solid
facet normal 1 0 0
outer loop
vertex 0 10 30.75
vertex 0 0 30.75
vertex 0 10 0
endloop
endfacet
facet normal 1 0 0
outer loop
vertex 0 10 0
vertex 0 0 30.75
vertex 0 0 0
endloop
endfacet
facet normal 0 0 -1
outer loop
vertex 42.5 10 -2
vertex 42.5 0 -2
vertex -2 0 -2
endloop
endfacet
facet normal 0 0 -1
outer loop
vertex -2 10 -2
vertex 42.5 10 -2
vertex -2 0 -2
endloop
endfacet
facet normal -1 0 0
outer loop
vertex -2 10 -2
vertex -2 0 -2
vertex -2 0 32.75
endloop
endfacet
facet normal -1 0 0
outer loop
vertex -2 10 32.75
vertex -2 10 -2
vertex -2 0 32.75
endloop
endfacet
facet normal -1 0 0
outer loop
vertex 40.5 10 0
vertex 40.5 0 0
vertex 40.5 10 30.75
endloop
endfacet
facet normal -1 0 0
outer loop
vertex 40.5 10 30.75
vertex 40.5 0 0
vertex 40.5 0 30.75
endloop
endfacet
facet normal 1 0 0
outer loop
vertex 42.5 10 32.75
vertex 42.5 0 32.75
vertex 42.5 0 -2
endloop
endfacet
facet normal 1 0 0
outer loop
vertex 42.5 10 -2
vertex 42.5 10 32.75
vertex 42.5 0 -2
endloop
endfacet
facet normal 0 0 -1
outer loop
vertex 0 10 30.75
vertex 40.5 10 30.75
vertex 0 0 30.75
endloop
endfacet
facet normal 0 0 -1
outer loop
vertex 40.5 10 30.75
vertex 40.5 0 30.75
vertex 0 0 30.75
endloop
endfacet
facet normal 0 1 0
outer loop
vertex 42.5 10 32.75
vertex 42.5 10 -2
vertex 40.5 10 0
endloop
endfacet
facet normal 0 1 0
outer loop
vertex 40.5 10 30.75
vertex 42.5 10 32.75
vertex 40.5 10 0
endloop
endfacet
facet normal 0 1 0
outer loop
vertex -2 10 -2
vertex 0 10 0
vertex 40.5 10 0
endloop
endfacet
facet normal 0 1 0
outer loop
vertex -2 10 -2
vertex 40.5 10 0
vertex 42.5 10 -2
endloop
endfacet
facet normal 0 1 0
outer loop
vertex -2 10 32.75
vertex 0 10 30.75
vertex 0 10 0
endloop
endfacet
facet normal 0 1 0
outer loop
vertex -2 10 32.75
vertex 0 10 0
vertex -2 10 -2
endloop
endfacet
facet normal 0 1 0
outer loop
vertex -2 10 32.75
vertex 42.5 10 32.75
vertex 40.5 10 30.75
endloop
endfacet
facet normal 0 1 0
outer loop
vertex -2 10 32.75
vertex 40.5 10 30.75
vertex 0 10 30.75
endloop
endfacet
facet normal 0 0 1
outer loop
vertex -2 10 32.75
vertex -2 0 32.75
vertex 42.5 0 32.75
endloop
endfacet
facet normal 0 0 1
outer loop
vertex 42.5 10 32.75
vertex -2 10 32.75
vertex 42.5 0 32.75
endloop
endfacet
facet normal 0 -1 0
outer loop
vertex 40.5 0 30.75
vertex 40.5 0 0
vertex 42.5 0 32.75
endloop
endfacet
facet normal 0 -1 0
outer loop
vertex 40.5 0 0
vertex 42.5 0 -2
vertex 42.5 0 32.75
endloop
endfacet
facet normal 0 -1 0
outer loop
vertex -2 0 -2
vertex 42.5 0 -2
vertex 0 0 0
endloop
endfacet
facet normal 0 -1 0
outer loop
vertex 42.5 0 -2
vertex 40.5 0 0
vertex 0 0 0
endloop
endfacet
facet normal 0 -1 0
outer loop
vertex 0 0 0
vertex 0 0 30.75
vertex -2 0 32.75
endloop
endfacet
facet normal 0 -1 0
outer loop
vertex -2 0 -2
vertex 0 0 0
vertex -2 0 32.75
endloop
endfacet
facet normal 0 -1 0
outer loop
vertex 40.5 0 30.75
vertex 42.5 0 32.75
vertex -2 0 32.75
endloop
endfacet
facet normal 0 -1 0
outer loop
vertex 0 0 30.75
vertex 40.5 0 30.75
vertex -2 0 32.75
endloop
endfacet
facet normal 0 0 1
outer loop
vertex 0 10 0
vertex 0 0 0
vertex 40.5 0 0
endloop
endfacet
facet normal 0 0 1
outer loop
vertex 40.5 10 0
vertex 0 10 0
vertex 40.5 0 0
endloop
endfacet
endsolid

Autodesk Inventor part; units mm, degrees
ref_plane "XZ Plane" through (0, 0, 0) normal (0, 1, 0) x (-1, 0, 0)
sketch "Sketch1" plane through (0, 0, 0) normal (0, 1, 0) x (-1, 0, 0)
  line L0 (0, 0) -> (-40.5, 0)
  line L1 (-40.5, 0) -> (-40.5, 30.75)
  line L2 (-40.5, 30.75) -> (0, 30.75)
  line L3 (0, 30.75) -> (0, 0)
  line L4 (2, 32.75) -> (-42.5, 32.75)
  line L5 (-42.5, 32.75) -> (-42.5, -2)
  line L6 (-42.5, -2) -> (2, -2)
  line L7 (2, -2) -> (2, 32.75)
  dimension "d2" = 40.5
  dimension "d3" = 30.75
  dimension "d4" = 2
extrude "Extrusion1" add sketch "Sketch1" along normal blind 10
ref_plane "Work Plane19" through (0, 5, 0) normal (0, 1, 0) x (1, 0, 0)
ref_plane "Work Plane20" through (42.5, 5, 32.75) normal (-0.7071, -0.7071, 0) x (0, 0, 1)
sketch "Sketch2" plane through (42.5, 5, 32.75) normal (-0.7071, -0.7071, 0) x (0, 0, 1)
  line L0 (0, -3.5355) -> (-34.75, -3.5355) construction
  line L1 (-34.75, -3.5355) -> (-34.75, 3.5355) construction
  line L2 (0, 3.5355) -> (-34.75, 3.5355) construction
  line L3 (0, -3.5355) -> (0, 3.5355) construction
  line L4 (-41.7, 0) -> (6.95, 0) construction
  line L5 (-34.75, 0) -> (-86.722, -105.5837)
  line L6 (-32.75, 33.5876) -> (-32.75, 4.9497) projected
  arc A0 (-86.722, -105.5837) -> (-80.0972, -119.7206) centre (-77.75, -110) ccw construction
  line L7 (-87.75, -113.6702) -> (-87.75, -110) construction
  line L8 (-87.75, -110) -> (-87.75, -104.3872) construction
  arc A1 (-86.722, -105.5837) -> (-87.75, -110) centre (-77.75, -110) ccw
  arc A2 (-87.75, -110) -> (-84.8211, -117.0711) centre (-77.75, -110) ccw
  point P0 (-32.75, 26.5165)
  dimension "d15" = 110
  dimension "d16" = 55
  dimension "d21" = 45
  dimension "d22" = 10
properties part number "central_foot"
